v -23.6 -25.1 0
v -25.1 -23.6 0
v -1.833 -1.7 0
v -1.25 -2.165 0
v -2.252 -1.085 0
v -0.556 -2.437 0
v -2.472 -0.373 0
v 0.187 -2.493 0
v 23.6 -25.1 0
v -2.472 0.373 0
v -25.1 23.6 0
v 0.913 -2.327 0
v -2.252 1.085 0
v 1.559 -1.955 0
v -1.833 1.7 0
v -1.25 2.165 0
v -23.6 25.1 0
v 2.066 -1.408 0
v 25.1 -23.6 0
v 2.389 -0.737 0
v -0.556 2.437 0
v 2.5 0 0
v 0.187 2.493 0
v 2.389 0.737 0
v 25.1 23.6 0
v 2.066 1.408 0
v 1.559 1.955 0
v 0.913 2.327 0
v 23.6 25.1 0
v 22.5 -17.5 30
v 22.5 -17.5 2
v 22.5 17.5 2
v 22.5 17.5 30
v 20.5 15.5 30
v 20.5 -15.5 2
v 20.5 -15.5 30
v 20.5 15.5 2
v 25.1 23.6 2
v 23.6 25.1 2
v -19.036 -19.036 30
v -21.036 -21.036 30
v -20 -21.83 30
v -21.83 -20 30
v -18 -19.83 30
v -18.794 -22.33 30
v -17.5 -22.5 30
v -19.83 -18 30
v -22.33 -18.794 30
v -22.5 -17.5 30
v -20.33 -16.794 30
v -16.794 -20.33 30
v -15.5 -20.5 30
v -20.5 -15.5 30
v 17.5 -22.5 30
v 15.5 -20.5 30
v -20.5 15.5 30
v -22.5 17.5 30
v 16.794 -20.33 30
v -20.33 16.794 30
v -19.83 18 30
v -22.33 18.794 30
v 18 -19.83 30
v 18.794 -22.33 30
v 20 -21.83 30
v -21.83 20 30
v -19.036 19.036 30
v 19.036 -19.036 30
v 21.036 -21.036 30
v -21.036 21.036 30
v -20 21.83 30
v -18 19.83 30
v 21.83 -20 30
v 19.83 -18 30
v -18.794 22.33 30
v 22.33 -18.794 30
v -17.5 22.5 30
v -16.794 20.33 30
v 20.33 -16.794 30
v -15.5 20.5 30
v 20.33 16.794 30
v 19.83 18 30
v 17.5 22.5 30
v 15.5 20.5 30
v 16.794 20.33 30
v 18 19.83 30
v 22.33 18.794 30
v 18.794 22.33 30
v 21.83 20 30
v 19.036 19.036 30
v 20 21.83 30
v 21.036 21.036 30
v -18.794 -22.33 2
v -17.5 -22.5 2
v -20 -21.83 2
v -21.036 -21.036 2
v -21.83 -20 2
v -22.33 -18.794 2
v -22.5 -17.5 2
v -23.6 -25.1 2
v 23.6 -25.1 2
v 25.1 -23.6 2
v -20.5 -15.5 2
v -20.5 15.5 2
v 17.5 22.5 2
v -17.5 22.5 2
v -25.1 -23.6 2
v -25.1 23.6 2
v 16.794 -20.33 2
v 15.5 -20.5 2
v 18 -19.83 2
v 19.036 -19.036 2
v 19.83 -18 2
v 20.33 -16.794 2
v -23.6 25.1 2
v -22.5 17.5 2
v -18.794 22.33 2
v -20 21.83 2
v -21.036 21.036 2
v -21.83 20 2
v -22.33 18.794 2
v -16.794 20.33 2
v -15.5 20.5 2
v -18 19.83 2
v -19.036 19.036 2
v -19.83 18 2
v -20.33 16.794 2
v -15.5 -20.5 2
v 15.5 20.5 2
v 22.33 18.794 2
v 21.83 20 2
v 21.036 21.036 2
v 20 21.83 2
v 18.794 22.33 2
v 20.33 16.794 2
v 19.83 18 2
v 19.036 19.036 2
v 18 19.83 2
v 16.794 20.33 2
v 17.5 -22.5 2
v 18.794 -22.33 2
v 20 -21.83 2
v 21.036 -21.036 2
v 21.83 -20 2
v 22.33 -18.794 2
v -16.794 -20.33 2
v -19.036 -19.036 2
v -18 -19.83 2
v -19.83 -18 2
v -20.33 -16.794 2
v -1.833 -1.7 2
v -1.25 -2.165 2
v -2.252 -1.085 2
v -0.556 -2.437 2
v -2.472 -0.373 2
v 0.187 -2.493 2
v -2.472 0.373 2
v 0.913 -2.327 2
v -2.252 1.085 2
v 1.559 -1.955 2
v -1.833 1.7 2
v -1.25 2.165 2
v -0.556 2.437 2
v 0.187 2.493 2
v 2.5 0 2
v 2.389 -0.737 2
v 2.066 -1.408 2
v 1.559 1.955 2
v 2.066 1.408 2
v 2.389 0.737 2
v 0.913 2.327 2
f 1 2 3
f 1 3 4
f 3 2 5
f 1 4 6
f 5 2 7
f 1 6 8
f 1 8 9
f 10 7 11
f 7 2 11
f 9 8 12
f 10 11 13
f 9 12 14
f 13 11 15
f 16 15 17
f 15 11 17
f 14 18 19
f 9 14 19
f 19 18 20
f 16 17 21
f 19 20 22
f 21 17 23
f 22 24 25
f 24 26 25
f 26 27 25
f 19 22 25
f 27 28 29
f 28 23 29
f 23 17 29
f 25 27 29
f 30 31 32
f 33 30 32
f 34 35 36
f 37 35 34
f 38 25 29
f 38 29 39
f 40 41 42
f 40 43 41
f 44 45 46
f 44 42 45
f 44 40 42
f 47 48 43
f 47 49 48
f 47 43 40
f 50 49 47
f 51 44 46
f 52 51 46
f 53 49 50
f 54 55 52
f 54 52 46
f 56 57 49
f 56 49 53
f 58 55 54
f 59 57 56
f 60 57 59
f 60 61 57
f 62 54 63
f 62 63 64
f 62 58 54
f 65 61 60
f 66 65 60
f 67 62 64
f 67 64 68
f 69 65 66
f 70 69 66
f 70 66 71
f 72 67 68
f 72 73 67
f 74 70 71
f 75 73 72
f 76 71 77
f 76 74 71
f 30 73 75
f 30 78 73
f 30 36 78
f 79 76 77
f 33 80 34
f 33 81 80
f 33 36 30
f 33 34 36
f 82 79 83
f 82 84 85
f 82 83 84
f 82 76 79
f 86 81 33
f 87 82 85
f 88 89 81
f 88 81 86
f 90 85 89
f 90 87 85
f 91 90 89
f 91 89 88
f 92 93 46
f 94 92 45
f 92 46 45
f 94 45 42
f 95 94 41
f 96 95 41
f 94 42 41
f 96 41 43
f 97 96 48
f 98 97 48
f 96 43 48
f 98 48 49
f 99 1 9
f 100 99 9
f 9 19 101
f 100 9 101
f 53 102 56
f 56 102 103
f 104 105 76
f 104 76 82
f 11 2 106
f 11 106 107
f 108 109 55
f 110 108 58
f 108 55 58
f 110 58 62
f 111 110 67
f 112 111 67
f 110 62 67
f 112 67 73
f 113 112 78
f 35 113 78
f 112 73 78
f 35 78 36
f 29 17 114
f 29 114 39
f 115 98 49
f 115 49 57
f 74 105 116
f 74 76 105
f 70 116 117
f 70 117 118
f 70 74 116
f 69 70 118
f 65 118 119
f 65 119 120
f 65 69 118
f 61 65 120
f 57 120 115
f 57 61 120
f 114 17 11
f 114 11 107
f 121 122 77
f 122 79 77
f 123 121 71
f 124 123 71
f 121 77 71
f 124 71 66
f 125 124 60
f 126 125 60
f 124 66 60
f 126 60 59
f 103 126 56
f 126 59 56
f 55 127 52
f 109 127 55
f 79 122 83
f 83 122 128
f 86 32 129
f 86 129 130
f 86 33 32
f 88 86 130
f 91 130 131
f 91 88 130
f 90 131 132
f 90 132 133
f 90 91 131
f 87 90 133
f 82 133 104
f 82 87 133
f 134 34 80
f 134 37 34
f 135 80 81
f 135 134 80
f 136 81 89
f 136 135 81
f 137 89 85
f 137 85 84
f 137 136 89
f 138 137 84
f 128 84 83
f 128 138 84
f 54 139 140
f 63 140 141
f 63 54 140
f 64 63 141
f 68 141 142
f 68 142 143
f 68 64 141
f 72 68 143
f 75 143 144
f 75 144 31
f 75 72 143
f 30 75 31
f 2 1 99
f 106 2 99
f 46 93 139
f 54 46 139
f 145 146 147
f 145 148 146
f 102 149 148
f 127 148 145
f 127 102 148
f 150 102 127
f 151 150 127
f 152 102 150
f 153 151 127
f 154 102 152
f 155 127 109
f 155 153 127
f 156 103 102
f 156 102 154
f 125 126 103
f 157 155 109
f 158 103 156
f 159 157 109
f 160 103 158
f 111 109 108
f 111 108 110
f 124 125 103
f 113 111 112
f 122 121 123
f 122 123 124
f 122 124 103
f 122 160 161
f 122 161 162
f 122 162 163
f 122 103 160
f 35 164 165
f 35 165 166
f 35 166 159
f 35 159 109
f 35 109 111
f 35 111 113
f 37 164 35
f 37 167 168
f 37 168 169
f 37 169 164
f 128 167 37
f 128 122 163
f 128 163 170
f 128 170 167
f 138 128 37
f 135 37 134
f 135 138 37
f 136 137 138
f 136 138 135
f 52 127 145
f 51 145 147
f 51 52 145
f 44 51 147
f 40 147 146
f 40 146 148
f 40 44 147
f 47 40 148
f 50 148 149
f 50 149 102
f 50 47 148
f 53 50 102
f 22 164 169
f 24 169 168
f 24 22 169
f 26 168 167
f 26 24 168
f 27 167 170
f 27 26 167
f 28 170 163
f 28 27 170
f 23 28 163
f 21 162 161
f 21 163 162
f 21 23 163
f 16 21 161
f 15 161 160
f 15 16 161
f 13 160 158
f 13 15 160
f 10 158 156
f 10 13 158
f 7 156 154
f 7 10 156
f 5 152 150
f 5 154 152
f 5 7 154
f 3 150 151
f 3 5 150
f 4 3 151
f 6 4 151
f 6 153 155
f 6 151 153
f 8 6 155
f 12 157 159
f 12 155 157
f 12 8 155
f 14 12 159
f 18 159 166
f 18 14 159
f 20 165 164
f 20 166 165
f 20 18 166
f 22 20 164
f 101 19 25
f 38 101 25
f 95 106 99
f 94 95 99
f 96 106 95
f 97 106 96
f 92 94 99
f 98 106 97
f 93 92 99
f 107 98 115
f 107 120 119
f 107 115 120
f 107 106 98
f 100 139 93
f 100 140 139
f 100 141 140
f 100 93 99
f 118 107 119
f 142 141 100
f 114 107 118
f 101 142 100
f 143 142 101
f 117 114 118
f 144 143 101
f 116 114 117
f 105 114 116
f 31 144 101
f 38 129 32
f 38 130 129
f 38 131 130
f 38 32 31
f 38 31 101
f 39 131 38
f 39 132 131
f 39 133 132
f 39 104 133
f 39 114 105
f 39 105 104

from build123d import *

# Parameters (mm, degrees)
F0_W     = 45
F0_H     = 45
F0_R     = 2.5
F1_DEPTH = 30
F0_W_2   = 50.2
F0_H_2   = 50.2
F2_DEPTH = 2
F3_T     = -2
F4_R     = 5
F5_SIZE  = 1.5


with BuildPart() as f1:
    # F0 (on Top) → F1 (new body)
    with BuildSketch(Plane.XY):
        Rectangle(F0_W, F0_H)
        Circle(F0_R, mode=Mode.SUBTRACT)
    extrude(amount=F1_DEPTH)

    # F0 (on Top) → F2 (join)
    with BuildSketch(Plane.XY):
        Rectangle(F0_W_2, F0_H_2)
        Rectangle(F0_W, F0_H, mode=Mode.SUBTRACT)
    extrude(amount=F2_DEPTH)

    # F3
    f3_openings = [f1.faces().sort_by_distance(p)[0] for p in [
        (0, 21.863604, 30),
        (-2.5, 0, 15),
    ]]
    offset(amount=F3_T, openings=f3_openings, kind=Kind.INTERSECTION)

    # F4
    f4_edges = [f1.edges().sort_by_distance(p)[0] for p in [
        (-22.5, -22.5, 16),
        (22.5, -22.5, 16),
        (22.5, 22.5, 16),
        (-22.5, 22.5, 16),
        (20.5, 20.5, 16),
        (-20.5, 20.5, 16),
        (-20.5, -20.5, 16),
        (20.5, -20.5, 16),
    ]]
    fillet(f4_edges, radius=F4_R)

    # F5
    f5_edges = [f1.edges().sort_by_distance(p)[0] for p in [
        (25.1, 25.1, 1),
        (25.1, -25.1, 1),
        (-25.1, 25.1, 1),
        (-25.1, -25.1, 1),
    ]]
    chamfer(f5_edges, length=F5_SIZE)


solid = f1.part
